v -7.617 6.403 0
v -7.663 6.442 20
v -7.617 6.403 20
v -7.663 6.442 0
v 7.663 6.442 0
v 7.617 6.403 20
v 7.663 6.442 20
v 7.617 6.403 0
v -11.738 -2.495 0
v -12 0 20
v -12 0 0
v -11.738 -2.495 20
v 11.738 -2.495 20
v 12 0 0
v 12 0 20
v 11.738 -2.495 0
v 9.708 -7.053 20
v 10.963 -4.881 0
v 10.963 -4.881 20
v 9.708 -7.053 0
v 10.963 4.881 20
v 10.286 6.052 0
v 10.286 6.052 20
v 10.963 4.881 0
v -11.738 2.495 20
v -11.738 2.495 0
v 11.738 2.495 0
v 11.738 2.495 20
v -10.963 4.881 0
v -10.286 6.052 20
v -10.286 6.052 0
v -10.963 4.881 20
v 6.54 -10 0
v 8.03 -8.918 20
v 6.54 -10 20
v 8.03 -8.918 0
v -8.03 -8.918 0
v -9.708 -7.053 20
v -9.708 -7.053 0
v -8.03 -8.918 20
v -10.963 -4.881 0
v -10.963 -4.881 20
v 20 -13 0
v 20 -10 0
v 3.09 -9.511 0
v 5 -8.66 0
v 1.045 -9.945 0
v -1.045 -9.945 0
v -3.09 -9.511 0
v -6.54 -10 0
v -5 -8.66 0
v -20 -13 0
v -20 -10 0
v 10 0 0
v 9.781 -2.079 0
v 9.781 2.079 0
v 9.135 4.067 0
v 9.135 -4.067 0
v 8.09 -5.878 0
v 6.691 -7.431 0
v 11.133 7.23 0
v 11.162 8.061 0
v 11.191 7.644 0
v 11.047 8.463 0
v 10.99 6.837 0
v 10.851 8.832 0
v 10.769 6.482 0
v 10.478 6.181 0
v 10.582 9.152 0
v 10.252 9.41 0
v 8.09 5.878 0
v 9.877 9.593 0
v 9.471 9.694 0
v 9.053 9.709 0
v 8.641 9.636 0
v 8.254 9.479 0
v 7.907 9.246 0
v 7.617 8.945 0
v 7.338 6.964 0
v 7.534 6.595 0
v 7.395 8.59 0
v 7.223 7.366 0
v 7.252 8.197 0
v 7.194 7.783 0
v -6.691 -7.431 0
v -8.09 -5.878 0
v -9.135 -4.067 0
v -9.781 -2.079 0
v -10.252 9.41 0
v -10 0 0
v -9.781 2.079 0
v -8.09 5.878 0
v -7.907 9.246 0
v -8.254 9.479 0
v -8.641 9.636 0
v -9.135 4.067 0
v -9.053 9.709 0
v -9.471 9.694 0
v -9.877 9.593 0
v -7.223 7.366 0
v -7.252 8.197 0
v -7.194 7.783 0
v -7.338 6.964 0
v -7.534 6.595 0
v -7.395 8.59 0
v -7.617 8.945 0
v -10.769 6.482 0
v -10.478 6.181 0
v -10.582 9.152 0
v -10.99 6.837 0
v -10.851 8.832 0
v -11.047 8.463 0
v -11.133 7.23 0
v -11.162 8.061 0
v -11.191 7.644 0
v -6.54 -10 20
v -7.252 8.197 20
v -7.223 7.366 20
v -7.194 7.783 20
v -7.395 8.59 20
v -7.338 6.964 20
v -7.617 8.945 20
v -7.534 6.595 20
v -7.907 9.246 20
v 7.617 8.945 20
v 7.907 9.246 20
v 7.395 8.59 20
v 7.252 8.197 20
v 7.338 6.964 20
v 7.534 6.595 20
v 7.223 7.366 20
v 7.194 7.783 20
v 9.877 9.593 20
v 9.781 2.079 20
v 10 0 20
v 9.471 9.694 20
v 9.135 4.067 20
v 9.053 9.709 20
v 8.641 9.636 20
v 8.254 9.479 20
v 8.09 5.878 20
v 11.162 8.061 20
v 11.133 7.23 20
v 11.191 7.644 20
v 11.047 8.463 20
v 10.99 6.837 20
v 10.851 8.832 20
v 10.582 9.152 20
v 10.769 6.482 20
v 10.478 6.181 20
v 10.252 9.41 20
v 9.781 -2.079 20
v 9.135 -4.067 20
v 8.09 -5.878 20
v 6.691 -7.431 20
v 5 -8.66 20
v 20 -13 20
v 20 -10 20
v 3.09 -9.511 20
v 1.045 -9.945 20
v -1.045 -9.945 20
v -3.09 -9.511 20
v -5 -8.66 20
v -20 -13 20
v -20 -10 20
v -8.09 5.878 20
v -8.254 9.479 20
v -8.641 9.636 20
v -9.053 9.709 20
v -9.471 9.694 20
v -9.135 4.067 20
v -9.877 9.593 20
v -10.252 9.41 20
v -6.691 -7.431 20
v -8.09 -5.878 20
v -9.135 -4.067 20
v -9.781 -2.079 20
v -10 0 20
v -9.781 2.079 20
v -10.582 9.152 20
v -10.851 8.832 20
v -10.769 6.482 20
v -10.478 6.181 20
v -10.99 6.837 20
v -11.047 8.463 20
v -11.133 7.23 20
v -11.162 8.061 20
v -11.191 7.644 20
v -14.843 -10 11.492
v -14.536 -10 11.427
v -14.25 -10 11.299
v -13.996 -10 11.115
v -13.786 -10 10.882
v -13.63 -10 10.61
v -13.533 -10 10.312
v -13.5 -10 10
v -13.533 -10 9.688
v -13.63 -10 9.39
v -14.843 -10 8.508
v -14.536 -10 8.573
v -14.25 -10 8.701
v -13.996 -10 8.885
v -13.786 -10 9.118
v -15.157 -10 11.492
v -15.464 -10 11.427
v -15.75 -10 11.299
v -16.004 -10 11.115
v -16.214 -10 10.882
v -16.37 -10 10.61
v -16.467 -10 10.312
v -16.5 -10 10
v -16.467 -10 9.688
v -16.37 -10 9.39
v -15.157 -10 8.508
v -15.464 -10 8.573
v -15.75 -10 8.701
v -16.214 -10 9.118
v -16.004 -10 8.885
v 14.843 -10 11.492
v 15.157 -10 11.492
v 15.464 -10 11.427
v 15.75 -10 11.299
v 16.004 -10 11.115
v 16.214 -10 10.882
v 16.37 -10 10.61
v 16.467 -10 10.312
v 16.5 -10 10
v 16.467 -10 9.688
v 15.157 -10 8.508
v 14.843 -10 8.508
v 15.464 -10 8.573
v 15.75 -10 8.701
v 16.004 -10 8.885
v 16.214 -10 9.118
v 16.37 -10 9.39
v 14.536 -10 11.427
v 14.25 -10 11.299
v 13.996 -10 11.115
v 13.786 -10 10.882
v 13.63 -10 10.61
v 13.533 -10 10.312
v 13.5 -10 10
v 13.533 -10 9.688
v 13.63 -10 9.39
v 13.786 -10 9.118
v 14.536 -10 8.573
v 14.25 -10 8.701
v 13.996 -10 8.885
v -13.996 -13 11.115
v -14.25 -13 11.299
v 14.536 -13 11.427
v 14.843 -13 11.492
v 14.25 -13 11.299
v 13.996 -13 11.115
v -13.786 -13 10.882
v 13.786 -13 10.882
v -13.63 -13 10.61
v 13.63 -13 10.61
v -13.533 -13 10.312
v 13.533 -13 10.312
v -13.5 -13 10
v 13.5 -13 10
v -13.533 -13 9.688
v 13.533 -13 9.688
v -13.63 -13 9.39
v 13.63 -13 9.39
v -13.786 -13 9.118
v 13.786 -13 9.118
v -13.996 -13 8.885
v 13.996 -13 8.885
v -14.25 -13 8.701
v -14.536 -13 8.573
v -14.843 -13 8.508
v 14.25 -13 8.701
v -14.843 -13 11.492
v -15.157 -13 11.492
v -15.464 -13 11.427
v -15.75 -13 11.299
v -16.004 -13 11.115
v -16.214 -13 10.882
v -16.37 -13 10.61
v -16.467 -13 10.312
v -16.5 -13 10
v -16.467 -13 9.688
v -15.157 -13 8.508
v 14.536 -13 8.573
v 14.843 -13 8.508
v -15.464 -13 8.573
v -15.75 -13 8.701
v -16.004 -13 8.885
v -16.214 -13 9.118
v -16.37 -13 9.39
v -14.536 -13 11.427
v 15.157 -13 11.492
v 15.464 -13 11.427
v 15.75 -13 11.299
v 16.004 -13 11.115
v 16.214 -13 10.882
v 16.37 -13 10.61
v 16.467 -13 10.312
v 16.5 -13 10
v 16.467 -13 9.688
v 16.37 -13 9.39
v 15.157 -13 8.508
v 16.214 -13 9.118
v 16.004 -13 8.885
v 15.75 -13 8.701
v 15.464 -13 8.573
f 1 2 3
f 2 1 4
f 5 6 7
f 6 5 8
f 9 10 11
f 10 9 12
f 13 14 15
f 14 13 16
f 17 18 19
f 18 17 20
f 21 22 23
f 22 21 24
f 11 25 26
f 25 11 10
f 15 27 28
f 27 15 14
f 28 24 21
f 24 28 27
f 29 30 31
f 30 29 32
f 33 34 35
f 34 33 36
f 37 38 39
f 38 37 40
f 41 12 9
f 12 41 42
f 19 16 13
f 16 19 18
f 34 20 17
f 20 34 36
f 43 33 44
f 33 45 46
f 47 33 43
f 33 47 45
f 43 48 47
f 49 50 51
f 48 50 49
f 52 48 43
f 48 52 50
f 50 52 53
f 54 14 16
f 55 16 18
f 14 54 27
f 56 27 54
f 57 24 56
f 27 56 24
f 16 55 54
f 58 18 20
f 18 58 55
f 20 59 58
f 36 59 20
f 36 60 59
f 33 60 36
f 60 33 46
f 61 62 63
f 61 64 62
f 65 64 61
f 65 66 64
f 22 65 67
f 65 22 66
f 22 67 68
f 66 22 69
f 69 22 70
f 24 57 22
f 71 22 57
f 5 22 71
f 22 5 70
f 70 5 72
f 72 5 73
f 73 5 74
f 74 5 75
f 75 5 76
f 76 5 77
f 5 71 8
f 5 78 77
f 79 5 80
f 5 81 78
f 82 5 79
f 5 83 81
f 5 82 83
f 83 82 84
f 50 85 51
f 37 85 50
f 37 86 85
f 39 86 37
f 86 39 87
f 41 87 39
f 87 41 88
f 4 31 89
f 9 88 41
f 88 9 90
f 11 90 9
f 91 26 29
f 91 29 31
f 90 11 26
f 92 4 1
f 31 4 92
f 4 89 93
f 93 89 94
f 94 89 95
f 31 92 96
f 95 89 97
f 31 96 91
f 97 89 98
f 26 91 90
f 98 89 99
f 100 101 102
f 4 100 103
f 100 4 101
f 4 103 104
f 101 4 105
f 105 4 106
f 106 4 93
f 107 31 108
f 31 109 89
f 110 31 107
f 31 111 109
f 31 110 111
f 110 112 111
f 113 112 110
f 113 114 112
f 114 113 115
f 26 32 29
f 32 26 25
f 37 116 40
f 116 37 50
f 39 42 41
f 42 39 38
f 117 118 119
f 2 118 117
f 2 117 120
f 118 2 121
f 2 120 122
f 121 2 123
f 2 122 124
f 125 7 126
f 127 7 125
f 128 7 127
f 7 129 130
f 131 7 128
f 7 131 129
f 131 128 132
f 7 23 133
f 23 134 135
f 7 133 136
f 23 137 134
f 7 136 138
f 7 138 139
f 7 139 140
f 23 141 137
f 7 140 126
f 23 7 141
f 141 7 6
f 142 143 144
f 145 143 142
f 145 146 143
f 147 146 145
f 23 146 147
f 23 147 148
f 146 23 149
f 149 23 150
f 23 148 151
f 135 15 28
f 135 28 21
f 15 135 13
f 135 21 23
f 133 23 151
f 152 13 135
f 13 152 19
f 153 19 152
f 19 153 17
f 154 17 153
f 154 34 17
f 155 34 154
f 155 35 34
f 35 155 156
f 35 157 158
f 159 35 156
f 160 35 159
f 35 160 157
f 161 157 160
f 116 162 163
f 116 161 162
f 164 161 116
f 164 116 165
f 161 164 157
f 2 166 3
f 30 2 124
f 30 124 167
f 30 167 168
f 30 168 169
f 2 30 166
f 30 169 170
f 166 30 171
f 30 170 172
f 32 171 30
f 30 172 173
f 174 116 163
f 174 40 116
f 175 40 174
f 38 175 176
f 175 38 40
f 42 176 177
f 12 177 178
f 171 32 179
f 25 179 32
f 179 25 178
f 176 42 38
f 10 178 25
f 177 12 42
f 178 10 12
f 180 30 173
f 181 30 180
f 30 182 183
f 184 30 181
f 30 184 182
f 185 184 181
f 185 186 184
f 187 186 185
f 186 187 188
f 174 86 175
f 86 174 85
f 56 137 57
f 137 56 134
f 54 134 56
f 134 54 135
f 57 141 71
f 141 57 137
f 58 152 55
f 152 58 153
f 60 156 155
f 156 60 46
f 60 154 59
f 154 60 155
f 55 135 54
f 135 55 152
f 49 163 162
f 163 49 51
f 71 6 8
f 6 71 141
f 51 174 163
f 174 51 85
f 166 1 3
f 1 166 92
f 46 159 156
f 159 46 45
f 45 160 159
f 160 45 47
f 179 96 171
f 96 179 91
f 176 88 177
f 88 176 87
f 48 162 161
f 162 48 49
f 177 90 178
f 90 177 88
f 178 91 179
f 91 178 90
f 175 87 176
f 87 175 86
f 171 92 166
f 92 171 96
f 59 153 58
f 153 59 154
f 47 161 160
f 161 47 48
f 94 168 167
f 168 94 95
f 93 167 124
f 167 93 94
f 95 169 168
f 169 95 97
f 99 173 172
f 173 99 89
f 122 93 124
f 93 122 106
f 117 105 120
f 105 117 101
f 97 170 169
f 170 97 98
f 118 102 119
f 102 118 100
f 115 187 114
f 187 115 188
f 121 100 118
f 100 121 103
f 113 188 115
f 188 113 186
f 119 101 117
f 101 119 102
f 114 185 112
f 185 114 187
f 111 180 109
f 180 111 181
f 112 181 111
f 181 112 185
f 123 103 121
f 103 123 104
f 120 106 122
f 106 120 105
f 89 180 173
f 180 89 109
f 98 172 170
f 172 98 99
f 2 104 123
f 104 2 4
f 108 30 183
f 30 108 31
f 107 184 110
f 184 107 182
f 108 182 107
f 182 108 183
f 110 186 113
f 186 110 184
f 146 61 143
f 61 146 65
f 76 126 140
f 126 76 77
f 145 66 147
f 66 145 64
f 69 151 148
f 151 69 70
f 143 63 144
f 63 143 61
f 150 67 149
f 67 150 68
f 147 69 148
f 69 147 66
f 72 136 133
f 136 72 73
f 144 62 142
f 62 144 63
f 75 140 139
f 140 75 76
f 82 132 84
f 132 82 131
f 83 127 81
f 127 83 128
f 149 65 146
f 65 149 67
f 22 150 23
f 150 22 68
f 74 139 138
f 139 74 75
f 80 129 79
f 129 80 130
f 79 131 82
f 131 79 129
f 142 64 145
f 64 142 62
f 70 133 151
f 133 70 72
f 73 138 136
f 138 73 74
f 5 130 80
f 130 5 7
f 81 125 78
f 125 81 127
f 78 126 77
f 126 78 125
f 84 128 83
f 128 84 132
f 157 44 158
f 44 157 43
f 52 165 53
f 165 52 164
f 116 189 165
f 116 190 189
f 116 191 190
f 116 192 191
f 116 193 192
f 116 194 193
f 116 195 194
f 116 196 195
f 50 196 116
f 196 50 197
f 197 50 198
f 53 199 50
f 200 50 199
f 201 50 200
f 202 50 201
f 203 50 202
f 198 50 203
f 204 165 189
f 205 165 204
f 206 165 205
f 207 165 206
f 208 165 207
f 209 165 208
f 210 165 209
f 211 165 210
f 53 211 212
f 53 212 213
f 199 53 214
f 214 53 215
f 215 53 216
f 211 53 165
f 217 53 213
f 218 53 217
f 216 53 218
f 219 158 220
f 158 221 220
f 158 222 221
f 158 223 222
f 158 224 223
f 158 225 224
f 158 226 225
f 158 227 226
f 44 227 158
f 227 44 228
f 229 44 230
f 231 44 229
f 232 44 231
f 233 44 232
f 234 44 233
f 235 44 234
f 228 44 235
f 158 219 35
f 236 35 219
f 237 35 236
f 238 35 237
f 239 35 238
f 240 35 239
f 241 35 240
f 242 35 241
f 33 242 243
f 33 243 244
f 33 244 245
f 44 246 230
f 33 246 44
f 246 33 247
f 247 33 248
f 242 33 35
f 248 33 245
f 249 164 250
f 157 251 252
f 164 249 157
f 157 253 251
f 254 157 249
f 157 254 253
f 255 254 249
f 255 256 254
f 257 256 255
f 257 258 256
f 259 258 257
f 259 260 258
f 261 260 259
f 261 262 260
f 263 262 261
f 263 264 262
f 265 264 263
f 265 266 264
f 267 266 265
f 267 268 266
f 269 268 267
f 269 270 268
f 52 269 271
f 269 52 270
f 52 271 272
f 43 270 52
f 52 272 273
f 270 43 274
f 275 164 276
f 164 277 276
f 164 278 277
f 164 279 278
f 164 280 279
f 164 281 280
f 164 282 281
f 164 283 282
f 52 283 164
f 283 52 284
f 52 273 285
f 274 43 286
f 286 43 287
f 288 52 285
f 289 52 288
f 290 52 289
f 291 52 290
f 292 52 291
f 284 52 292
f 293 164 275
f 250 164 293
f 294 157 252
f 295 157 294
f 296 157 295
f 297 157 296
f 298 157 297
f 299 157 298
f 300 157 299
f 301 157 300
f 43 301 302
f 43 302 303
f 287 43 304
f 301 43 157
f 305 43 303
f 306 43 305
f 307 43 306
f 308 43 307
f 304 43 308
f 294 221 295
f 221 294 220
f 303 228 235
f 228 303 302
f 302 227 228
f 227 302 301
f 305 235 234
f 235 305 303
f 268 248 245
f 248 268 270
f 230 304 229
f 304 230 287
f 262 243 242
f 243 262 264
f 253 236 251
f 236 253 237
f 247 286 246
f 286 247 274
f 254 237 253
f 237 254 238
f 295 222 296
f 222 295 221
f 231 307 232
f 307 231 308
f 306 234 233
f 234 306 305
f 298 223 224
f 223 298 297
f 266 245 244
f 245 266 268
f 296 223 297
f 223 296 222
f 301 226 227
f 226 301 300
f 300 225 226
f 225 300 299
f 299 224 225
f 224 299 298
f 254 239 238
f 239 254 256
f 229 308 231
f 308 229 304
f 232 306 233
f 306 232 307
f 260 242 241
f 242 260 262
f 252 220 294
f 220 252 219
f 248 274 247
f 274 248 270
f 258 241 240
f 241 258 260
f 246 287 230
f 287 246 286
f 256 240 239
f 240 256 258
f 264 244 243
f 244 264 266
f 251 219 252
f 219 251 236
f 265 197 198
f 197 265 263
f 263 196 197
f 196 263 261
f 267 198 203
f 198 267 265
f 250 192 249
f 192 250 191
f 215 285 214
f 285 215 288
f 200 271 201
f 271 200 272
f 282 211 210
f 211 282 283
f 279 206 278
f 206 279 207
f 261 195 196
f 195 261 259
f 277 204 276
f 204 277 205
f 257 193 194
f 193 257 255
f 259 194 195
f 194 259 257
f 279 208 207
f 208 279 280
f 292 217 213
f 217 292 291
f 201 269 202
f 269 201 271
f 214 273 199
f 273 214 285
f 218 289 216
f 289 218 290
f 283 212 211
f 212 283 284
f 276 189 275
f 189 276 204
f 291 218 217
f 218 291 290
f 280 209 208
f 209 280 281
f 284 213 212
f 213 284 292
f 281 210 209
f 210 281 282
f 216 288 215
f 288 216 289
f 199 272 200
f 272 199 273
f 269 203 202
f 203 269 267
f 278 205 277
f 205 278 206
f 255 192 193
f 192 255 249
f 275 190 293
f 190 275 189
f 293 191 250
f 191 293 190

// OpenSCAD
// Parametric Round Clip Holder
// Generates an adjustable set of round clips with mounting ears
// Garrett Mace April 7th 2011
// moded for makerbot custiomizer by jhack 25/3/2013


// Parameters
// Number of clips on the bracket
clipNumber = 1;		//[1:50]		
// Distance between clip centers
clipSpacing = 30;	//[1:100]	
// Diameter of the clip inside face		
clipInnerDiameter = 20;//[5:100]
// Width (height) of clip
clipWidth = 20;		//[5:100]		
// Thickness of clip walls
clipWallThickness = 2;	//[2:10]
// Amount of clip ring to remove from top (valid between 0 and 180)
clipOpeningAngle = 100;//[0:180]	
	
// Thickness of mounting bracket
bracketThickness = 3;	//[2:10]	
// Length of mounting ears from center of first and last clips
mountEarsLength = 20;	//[5:100]		
// Position of mounting holes from edge of mounting ears
mountHoleOffset = 5;	//[2:10]		
// Diameter of the mounting holes
mountHoleDiameter = 3;	 //[1:10]	

/* [hidden] */
$fs = 0.25;

// Round clip
module roundClip() {
difference() {
	cylinder(r = (clipInnerDiameter/2 + clipWallThickness), h = clipWidth);
	translate([0,0,-1]) cylinder(r = clipInnerDiameter/2, h = clipWidth + 2);
	translate([0,0,-1]) union () {
		rotate([0,0,clipOpeningAngle/4-0.05]) intersection() {
			rotate([0,0,clipOpeningAngle/4]) cube([clipInnerDiameter+clipWallThickness+1,clipInnerDiameter+clipWallThickness+1,clipWidth+2]);
			rotate ([0,0,-clipOpeningAngle/4]) translate([-(clipInnerDiameter+clipWallThickness+1),0,0]) cube([clipInnerDiameter+clipWallThickness+1,clipInnerDiameter+clipWallThickness+1,clipWidth+2]);
			cylinder(r=clipInnerDiameter+clipWallThickness+1,h=clipWidth+2);
		}

		rotate([0,0,-clipOpeningAngle/4+0.05]) intersection() {
			rotate([0,0,clipOpeningAngle/4]) cube([clipInnerDiameter+clipWallThickness+1,clipInnerDiameter+clipWallThickness+1,clipWidth+2]);
			rotate ([0,0,-clipOpeningAngle/4]) translate([-(clipInnerDiameter+clipWallThickness+1),0,0]) cube([clipInnerDiameter+clipWallThickness+1,clipInnerDiameter+clipWallThickness+1,clipWidth+2]);
			cylinder(r=clipInnerDiameter+clipWallThickness+1,h=clipWidth+2);
		}
	}
}

rotate([0,0,clipOpeningAngle/2]) translate([0,clipInnerDiameter/2+clipWallThickness,0]) cylinder(r = clipWallThickness, h = clipWidth);
//#rotate([0,0,clipOpeningAngle/2]) translate([0,clipInnerDiameter/2+clipWallThickness*2,0]) cylinder(r = clipWallThickness, h = clipWidth);

rotate([0,0,-clipOpeningAngle/2]) translate([0,clipInnerDiameter/2+clipWallThickness,0]) cylinder(r = clipWallThickness, h = clipWidth);
}

// Create clips
translate([-(clipSpacing*(clipNumber-1))/2,0,0]) for (clipPos = [0:clipNumber-1]) {
	translate([clipPos*clipSpacing,0,0]) roundClip();
}

// Calculations
calcs_bracketLength = clipSpacing*(clipNumber-1)+mountEarsLength*2;

// Mounting bracket and holes
difference() {
	translate([-calcs_bracketLength/2,-clipInnerDiameter/2-bracketThickness,0]) cube([calcs_bracketLength,bracketThickness,clipWidth]);
	translate([calcs_bracketLength/2-mountHoleOffset,-clipInnerDiameter/2-bracketThickness-1,clipWidth/2]) rotate([-90,0,0]) cylinder(r = mountHoleDiameter/2, h = bracketThickness+2);
	translate([-calcs_bracketLength/2+mountHoleOffset,-clipInnerDiameter/2-bracketThickness-1,clipWidth/2]) rotate([-90,0,0]) cylinder(r = mountHoleDiameter/2, h = bracketThickness+2);

}
